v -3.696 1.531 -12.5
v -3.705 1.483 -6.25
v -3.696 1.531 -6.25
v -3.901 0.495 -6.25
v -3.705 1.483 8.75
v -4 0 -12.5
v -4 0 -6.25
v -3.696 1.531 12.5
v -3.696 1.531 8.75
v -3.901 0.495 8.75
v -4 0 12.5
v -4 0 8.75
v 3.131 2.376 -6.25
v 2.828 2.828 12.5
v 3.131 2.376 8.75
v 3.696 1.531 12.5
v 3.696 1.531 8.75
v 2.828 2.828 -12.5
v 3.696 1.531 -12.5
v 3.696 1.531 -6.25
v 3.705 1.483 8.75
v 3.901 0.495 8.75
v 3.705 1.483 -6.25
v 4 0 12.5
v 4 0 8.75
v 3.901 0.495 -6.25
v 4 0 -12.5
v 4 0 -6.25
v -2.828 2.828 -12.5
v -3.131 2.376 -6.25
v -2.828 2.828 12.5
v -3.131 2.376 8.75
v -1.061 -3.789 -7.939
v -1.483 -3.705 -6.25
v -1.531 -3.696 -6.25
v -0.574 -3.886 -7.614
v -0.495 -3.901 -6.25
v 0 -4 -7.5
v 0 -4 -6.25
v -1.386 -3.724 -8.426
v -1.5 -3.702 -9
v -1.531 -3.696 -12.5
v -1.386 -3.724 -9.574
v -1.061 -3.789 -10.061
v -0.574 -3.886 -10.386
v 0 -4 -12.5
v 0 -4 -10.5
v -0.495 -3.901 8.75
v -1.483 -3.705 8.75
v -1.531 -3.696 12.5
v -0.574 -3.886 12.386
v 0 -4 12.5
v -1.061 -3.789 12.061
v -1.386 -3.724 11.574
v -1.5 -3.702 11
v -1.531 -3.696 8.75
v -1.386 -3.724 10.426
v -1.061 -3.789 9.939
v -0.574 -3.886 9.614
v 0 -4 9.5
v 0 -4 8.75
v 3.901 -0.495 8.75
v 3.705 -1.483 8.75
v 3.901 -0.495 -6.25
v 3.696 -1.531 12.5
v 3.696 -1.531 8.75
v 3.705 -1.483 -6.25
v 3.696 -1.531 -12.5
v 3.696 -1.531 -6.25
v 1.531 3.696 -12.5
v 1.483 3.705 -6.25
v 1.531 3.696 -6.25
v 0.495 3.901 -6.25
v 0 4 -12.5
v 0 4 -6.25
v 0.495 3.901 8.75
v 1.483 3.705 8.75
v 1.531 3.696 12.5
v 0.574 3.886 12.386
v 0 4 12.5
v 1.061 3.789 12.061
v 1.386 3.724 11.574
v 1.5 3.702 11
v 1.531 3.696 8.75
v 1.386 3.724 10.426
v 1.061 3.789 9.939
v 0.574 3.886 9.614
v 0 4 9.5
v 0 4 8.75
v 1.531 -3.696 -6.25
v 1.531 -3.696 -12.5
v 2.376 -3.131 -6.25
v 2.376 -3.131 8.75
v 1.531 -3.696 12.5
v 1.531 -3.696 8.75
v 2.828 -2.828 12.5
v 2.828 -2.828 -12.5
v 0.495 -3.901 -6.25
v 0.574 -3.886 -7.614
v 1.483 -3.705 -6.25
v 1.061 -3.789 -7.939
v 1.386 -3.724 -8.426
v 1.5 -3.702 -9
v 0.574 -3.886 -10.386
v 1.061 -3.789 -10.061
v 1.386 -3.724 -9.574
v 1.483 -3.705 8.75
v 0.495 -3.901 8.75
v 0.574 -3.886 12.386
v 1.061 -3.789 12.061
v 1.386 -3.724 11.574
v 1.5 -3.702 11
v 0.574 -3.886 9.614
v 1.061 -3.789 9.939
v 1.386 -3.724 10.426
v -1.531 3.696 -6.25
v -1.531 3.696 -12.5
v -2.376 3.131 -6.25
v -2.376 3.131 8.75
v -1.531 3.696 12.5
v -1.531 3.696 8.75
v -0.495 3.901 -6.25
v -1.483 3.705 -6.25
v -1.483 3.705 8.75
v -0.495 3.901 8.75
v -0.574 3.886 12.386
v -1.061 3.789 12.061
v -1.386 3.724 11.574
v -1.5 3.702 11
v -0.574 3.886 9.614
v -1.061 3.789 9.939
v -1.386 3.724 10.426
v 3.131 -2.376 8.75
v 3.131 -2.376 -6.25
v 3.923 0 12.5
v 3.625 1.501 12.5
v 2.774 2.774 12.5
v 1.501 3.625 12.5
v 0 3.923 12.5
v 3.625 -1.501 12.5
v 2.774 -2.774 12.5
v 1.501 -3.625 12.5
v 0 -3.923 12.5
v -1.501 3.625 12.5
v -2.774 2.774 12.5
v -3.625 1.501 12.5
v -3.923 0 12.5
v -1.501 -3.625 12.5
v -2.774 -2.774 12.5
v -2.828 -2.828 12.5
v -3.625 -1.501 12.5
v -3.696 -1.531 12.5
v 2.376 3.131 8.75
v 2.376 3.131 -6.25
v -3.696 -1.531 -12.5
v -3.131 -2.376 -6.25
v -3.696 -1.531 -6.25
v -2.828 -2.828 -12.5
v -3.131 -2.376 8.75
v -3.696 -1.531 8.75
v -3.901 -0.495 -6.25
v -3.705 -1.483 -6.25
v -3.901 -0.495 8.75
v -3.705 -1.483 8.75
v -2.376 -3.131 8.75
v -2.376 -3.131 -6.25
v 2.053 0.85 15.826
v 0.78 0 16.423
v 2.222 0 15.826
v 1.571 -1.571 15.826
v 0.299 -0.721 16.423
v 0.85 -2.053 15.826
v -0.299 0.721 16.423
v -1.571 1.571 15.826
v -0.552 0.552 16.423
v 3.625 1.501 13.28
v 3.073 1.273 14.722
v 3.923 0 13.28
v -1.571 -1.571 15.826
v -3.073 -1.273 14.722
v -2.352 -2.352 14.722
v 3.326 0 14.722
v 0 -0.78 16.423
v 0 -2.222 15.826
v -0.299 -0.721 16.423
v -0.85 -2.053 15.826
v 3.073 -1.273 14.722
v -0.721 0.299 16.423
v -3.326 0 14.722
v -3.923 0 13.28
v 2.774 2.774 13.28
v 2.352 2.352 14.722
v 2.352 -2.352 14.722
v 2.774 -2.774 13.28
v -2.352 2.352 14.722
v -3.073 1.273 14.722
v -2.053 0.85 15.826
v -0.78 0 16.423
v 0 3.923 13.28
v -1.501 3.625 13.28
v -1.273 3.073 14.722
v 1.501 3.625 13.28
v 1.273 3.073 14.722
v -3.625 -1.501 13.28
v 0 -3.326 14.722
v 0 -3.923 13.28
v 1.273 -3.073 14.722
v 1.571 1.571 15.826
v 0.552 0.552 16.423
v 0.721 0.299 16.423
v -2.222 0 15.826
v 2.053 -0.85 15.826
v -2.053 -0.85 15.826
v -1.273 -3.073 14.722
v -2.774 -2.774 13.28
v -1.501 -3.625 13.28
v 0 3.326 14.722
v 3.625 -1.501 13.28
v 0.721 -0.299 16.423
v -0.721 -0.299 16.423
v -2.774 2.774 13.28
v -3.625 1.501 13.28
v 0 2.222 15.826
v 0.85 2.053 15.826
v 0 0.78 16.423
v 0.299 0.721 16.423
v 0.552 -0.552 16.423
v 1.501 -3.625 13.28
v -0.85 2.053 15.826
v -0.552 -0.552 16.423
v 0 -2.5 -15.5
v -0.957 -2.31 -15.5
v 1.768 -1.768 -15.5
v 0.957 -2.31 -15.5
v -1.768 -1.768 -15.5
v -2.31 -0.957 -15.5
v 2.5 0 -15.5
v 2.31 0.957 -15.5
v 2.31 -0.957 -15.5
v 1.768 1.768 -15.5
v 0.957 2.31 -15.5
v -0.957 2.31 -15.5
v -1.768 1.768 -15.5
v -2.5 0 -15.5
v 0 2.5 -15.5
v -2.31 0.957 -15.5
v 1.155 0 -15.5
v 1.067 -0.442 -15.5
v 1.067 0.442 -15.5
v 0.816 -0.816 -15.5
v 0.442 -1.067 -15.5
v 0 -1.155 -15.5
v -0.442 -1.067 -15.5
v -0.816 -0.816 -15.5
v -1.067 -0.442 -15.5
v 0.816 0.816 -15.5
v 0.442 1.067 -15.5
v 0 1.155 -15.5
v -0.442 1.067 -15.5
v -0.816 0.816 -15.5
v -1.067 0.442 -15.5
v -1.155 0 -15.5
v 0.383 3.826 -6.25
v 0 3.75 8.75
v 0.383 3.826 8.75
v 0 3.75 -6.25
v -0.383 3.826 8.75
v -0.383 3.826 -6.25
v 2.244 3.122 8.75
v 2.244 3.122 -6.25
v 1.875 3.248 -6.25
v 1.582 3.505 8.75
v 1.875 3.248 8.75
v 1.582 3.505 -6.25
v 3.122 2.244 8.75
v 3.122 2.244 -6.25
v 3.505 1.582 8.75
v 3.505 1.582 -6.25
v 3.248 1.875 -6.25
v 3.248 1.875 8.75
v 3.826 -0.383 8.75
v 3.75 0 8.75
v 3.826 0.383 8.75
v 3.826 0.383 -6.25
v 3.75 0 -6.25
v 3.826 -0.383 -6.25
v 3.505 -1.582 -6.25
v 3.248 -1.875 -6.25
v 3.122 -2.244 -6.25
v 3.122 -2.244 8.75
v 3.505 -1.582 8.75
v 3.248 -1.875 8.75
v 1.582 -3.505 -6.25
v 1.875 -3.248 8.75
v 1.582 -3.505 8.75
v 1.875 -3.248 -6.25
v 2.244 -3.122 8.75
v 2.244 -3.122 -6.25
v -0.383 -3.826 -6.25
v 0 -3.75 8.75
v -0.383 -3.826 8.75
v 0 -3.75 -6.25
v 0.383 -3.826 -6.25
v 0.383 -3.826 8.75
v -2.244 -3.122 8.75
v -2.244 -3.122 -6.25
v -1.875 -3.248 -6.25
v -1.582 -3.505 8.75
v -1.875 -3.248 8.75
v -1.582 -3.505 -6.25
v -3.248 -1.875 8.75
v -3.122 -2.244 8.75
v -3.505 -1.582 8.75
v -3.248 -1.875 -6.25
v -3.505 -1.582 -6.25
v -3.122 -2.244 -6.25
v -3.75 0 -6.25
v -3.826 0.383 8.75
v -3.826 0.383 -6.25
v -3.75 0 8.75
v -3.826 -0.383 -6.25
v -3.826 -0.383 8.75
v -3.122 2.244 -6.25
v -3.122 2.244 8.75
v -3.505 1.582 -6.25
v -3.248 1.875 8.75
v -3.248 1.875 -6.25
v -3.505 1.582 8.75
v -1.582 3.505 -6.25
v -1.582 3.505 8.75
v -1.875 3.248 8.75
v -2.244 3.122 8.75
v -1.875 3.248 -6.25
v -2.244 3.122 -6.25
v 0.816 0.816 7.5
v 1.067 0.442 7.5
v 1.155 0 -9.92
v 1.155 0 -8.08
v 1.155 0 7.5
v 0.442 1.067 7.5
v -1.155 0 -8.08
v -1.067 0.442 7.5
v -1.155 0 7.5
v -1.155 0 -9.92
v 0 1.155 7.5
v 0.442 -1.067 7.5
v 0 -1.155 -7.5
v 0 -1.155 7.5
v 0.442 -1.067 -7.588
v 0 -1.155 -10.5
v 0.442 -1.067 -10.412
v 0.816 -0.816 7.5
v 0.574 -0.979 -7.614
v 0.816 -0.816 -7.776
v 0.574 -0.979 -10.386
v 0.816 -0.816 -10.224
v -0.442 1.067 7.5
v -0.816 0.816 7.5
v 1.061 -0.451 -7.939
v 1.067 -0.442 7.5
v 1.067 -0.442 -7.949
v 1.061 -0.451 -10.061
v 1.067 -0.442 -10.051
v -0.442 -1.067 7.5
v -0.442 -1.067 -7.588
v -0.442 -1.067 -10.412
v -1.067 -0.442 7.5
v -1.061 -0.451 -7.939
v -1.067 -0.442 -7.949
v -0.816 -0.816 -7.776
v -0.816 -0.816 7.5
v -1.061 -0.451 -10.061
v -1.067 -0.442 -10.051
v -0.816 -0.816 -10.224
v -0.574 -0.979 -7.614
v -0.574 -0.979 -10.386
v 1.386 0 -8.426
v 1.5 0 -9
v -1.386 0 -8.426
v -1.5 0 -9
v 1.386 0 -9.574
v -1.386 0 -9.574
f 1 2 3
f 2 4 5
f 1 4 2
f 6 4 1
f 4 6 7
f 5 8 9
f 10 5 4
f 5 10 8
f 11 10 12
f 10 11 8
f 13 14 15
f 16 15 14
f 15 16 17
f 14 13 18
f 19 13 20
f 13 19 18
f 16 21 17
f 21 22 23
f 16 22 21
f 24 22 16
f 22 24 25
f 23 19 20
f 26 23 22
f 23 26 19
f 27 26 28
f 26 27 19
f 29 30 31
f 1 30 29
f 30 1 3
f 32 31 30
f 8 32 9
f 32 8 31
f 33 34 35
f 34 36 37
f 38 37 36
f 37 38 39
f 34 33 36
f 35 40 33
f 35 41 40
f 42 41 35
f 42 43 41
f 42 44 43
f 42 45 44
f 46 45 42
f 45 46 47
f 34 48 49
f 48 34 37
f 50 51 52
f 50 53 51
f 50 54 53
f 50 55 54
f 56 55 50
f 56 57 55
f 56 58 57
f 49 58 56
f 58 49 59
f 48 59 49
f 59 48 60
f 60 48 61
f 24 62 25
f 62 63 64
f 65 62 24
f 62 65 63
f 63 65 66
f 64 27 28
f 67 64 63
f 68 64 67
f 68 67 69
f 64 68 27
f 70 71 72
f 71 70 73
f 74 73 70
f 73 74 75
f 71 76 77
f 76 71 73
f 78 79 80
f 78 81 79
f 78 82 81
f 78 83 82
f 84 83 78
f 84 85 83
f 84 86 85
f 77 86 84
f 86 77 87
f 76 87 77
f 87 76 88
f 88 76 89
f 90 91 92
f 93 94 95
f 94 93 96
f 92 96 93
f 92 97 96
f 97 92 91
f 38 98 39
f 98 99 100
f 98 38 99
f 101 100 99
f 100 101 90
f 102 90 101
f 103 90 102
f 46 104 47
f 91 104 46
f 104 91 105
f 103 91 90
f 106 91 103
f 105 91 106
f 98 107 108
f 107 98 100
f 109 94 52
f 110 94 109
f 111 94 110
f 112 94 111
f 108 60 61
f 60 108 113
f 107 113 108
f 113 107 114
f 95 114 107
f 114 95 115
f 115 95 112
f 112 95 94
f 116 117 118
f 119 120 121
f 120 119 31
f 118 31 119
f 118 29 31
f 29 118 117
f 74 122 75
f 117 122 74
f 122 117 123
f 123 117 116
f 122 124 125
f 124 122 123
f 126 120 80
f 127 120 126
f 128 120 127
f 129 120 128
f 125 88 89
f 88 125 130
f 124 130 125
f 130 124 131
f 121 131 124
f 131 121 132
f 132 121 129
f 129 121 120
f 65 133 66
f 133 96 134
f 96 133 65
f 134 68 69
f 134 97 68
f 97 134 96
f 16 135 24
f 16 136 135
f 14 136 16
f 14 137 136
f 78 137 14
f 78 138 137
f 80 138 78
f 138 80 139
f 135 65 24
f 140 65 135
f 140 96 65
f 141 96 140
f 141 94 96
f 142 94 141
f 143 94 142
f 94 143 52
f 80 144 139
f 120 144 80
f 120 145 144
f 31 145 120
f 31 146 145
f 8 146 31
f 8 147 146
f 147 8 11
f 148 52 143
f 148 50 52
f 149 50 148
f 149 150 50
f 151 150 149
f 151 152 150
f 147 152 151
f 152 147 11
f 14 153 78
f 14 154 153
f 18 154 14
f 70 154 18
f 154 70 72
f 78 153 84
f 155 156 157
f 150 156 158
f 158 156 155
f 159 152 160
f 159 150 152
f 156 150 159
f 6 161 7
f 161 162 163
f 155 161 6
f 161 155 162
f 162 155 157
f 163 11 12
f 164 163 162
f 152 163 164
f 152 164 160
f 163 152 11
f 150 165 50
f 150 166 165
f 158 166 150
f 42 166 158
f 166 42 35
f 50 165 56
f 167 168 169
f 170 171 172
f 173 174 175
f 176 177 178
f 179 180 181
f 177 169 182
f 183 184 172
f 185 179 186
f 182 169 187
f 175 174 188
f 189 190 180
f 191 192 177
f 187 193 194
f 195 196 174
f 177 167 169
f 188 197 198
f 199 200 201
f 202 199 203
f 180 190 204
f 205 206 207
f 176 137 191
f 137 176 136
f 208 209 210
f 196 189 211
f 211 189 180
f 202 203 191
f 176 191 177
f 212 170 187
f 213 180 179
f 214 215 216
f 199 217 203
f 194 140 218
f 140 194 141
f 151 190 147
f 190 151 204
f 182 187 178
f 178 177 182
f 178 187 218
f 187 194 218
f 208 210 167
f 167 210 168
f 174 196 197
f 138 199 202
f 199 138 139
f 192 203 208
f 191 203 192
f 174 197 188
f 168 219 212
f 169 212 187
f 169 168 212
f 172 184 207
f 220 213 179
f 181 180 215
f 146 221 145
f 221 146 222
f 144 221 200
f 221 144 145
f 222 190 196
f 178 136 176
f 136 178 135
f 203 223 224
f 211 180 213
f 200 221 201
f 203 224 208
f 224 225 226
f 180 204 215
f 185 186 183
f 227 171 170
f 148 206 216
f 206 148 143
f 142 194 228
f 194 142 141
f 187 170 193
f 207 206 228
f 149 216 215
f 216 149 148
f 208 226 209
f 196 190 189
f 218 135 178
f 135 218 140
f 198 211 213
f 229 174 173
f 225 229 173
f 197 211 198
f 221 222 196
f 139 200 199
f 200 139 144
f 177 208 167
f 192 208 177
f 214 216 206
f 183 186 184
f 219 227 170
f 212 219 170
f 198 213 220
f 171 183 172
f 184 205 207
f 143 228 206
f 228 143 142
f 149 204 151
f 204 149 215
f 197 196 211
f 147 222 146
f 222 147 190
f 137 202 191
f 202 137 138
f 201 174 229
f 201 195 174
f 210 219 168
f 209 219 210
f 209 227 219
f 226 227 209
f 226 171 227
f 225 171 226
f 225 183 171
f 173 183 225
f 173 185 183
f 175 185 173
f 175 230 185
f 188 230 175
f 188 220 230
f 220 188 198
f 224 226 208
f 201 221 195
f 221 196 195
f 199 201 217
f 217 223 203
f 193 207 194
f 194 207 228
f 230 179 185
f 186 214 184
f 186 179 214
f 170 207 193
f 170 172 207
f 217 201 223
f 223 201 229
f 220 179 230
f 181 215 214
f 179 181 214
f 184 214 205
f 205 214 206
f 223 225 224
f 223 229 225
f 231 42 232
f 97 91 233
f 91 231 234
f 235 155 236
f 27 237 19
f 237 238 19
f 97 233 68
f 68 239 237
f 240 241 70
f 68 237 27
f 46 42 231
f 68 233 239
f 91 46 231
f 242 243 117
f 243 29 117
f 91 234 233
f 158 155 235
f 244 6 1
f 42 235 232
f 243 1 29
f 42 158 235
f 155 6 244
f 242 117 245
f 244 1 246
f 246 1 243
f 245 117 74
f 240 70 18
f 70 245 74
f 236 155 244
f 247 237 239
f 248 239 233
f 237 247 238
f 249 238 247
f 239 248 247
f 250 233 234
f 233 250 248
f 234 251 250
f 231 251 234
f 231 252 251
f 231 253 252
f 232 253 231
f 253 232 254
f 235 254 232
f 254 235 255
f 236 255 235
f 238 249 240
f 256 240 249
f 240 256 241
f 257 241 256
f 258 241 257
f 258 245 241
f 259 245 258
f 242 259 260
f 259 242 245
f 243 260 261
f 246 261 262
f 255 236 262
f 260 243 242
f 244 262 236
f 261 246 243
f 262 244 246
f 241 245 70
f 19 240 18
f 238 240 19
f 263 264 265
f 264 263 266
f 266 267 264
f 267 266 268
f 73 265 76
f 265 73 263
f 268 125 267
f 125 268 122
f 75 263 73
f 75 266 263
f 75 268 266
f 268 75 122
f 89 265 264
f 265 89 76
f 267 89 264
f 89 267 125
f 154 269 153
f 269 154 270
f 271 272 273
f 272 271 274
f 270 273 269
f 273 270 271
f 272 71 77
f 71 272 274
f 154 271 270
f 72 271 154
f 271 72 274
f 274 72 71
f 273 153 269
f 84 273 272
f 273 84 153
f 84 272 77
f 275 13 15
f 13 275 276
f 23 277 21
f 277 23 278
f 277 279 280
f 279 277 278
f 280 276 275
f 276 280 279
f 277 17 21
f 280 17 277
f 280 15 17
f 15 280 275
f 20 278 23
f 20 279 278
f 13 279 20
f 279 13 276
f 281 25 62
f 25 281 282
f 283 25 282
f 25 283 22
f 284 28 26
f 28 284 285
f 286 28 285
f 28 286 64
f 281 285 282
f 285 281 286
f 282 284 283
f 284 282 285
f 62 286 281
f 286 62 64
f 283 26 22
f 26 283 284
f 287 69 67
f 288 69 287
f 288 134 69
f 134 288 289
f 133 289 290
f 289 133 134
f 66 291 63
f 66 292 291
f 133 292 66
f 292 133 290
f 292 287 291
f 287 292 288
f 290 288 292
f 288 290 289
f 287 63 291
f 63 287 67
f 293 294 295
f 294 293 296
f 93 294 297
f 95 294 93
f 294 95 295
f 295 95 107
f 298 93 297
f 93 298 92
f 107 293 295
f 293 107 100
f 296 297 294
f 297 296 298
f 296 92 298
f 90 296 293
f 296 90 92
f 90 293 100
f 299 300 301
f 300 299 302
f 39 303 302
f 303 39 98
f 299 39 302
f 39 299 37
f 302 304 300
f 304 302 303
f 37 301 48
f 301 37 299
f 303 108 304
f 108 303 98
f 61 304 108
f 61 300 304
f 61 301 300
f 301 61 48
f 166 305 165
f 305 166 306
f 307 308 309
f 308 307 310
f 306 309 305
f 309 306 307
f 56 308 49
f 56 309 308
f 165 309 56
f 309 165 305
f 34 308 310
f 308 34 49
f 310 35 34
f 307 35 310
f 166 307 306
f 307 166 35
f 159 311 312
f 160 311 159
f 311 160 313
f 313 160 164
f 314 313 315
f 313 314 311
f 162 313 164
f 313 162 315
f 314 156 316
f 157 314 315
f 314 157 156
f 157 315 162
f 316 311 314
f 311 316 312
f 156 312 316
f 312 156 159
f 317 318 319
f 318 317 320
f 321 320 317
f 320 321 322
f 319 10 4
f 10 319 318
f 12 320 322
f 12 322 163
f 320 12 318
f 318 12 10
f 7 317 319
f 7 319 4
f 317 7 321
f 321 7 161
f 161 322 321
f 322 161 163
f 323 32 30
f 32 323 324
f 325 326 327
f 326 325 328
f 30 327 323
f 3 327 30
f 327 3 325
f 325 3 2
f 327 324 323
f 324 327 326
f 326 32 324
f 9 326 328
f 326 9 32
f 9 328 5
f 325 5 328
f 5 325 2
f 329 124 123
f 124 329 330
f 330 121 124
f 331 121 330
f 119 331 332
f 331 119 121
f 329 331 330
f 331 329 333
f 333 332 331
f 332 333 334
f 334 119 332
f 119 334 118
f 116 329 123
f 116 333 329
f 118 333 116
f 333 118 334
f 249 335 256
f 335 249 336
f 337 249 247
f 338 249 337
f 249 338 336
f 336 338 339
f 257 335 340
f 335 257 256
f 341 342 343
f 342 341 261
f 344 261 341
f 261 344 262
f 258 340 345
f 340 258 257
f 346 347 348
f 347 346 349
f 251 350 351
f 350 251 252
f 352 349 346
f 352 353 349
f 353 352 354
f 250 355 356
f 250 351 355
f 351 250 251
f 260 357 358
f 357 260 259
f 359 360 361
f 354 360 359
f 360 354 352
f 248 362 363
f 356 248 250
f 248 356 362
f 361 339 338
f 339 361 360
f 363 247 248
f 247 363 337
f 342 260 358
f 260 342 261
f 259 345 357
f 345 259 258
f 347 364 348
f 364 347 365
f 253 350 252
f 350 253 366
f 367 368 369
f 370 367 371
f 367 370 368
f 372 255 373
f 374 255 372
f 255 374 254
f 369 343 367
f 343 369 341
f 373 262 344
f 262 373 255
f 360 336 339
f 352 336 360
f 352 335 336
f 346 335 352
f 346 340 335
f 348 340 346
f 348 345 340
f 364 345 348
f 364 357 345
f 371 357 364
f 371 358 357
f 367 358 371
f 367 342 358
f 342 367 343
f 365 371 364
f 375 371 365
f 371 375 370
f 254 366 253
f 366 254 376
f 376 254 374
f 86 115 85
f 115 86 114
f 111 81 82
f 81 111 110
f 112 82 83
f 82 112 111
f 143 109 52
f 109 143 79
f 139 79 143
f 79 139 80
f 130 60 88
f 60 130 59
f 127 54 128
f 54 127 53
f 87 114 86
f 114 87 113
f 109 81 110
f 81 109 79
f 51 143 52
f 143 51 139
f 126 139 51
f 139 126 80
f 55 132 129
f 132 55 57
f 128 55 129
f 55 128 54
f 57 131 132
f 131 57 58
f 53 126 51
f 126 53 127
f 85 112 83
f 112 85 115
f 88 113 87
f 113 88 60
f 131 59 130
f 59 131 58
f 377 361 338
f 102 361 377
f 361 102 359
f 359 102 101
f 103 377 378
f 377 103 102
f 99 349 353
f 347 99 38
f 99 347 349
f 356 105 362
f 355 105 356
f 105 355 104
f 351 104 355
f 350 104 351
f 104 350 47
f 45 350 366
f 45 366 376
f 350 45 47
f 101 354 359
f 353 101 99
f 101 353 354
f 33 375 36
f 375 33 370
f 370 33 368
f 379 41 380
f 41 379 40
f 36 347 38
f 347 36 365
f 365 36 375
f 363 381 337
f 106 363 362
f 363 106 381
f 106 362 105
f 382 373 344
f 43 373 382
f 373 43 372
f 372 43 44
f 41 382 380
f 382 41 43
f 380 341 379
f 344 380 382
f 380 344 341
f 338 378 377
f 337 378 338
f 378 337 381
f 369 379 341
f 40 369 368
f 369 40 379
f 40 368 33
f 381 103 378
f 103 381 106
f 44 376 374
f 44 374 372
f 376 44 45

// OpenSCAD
// Author: Martin Cloutier
// Date  : 2017-02-08
// Email : mxclouti@gmail.com

$fn=16;  // Adjust

HoleSize = 2.0;  // Adjust
HoleRadius = (2*HoleSize)/sqrt(3)/2;

module handle()
{
    union()
    {
      cylinder(r=4,h=25,center=true);   
      translate([0,0,12.5]) sphere(r=4);
      translate([0,0,-14.0]) cylinder(h=3,r1=2.5,r2=4,center=true);
    }
}

difference()
{
  handle();
  translate([0,0,-5]) cylinder(r=HoleRadius,h=25,center=true);    
  for (a = [0 : 30 : 359])
  {
    rotate([0, 0, -a])
    translate([0, 4.75, 1.25])
    cylinder(r=1.0,h=15,center=true);
  }   
  
  rotate([90,0,0])
  translate([0,11,0])
  cylinder(r=1.5,h=20,center=true);
  
  rotate([90,0,0])
  translate([0,-9,5])
  cylinder(r=1.5,h=10,center=true);
}
